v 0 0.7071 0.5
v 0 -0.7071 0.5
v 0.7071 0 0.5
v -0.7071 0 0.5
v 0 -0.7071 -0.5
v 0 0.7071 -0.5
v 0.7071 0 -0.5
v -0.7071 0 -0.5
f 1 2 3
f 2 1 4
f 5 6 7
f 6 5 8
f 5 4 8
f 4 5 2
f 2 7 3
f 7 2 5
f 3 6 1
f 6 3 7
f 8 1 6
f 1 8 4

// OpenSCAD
// Start: lazy_union
default_5_default_5();
// End: lazy_union

// Modules.

// 'PartMaterial undef-default - undef-default'
module default_5_default_5() {
  // 'None : _combine_solids_and_holes'
  union() {
    // 'outer'
    multmatrix(m=[[0.7071067811865475, 0.7071067811865475, 0.0, -0.7071067811865475], [-0.7071067811865475, 0.7071067811865475, 0.0, 0.0], [0.0, 0.0, 1.0, -0.5], [0.0, 0.0, 0.0, 1.0]]) {
      // 'outer : _combine_solids_and_holes'
      union() {
        // 'outer'
        cube(size=[1.0, 1.0, 1.0]);
      }
    }
  }
} // end module default_5_default_5
